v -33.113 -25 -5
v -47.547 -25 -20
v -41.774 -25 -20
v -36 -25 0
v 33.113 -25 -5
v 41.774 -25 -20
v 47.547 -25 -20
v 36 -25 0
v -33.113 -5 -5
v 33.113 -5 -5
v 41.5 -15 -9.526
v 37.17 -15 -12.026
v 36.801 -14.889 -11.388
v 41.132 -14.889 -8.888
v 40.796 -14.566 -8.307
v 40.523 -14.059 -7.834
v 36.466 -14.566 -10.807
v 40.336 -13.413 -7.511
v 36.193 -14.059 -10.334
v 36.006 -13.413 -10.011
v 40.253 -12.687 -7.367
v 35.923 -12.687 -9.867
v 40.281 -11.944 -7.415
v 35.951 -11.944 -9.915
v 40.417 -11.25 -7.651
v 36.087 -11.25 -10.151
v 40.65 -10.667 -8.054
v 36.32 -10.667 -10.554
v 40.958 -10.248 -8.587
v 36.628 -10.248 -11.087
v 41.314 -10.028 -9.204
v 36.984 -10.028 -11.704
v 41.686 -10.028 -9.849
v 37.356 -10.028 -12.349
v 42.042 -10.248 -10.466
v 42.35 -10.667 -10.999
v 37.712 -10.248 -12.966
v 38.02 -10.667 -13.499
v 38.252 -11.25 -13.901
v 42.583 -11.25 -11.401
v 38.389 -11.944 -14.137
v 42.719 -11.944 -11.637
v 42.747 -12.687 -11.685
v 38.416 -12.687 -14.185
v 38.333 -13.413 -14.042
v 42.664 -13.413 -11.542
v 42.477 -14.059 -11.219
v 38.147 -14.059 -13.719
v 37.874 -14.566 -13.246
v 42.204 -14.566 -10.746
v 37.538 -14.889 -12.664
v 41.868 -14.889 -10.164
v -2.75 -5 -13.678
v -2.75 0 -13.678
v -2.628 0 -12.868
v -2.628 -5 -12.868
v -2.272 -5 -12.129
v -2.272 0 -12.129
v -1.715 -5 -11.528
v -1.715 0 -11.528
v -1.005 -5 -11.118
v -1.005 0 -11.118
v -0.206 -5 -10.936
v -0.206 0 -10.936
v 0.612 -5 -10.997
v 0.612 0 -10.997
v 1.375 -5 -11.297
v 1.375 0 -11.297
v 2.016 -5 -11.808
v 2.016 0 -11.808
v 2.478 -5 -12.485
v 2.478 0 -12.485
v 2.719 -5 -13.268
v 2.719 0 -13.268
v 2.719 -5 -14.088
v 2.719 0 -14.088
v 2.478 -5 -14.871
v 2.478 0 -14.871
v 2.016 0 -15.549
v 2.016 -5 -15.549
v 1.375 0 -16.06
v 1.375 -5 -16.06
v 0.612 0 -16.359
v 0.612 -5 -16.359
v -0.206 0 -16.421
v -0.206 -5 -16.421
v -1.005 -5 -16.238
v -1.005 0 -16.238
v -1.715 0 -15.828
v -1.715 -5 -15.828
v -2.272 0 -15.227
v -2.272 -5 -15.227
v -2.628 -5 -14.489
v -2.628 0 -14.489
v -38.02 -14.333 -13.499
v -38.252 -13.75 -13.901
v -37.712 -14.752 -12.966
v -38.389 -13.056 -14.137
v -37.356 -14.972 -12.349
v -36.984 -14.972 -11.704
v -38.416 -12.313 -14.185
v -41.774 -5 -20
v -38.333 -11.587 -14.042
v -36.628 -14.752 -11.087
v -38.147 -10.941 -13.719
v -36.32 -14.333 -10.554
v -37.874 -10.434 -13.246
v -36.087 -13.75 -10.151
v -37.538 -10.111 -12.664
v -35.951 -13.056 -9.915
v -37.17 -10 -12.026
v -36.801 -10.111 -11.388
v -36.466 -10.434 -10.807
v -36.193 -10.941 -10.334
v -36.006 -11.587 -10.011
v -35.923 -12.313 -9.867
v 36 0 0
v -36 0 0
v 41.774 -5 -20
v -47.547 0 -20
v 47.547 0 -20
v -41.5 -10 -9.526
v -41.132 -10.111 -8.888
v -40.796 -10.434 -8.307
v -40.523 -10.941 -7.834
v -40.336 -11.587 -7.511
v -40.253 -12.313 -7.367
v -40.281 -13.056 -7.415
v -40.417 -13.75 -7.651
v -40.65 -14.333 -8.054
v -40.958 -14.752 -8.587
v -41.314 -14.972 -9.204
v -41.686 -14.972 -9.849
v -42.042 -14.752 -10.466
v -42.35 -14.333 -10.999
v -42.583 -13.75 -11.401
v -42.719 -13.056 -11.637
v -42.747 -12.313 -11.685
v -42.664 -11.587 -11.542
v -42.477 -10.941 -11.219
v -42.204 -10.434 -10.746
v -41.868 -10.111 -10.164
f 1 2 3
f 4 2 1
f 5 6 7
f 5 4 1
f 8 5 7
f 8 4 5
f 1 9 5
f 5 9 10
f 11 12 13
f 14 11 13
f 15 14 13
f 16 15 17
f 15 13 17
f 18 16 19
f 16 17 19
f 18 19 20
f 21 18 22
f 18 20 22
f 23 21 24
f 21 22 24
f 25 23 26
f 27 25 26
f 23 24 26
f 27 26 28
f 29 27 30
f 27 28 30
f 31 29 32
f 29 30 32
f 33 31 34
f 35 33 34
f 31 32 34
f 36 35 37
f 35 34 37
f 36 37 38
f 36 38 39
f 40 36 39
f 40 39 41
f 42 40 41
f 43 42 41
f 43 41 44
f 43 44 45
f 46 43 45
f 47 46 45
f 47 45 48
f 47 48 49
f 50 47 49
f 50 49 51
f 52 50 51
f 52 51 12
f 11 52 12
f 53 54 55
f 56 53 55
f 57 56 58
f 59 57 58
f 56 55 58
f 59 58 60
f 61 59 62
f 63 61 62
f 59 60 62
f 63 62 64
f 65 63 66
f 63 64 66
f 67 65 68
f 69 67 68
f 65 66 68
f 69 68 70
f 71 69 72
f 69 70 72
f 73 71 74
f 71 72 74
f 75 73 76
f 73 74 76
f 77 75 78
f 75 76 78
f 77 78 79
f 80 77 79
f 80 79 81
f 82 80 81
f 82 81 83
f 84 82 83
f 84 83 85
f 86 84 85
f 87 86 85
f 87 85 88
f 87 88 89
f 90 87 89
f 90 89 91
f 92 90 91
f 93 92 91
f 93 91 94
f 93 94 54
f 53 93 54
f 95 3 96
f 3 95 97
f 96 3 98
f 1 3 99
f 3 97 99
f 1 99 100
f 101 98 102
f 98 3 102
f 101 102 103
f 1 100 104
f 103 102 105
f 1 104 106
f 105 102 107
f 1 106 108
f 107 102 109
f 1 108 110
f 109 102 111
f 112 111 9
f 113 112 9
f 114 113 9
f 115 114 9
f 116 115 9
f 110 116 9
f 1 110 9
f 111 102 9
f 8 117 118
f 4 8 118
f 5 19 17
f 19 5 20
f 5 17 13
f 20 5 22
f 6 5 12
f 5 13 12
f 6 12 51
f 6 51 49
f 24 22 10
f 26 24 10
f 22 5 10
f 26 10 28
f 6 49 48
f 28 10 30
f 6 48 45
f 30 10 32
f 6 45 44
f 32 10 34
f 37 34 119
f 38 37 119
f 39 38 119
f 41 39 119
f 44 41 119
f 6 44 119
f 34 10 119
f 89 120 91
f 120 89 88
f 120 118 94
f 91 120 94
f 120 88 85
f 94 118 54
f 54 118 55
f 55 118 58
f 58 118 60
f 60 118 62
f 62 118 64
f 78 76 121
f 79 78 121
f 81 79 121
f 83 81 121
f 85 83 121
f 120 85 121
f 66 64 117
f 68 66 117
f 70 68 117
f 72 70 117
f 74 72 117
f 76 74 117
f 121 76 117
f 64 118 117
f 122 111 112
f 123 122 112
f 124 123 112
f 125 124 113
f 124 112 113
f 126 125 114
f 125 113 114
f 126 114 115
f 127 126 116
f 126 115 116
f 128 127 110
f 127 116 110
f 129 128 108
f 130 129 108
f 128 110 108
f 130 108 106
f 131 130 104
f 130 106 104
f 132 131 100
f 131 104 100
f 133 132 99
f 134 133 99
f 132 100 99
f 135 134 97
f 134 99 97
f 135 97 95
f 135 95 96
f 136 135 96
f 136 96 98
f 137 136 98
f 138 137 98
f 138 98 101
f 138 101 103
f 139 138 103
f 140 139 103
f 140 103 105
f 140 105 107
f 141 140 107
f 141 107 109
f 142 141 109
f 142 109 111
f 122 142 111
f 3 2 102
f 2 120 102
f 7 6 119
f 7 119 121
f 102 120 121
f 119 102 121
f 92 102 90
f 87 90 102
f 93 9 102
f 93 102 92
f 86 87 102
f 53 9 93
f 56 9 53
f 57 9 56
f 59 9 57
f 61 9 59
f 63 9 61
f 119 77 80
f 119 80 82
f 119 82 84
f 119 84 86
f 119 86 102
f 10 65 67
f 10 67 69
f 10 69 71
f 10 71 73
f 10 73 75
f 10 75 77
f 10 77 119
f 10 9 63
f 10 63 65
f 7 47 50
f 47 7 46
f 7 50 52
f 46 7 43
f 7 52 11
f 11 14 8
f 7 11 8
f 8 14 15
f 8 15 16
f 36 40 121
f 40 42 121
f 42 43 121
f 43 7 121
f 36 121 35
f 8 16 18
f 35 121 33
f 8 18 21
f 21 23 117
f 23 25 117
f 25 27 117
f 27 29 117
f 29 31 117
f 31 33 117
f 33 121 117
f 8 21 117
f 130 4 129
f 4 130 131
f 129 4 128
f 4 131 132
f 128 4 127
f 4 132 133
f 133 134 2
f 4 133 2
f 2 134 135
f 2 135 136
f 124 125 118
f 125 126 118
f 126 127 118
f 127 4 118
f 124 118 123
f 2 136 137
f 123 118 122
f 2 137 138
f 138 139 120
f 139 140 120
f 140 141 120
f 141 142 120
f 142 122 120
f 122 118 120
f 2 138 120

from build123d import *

# Parameters (mm, degrees)
F1_DEPTH = 5
F3_DEPTH = 20
F5_D     = 5.5
F7_D     = 5
F9_D     = 5


with BuildPart() as f1:
    # F0 (on Front) → F1 (new body)
    with BuildSketch(Plane.XZ):
        Polygon((36, 0), (0, 0), (-36, 0), (-47.5470053838, -20), (0, -20), (47.5470053838, -20), align=None)
    extrude(amount=F1_DEPTH)

    # F2 (on face) → F3 (join)
    with BuildSketch(Plane.XZ.offset(5)):
        Polygon((-30.2264973081, 0), (-36, 0), (-47.5470053838, -20), (-41.7735026919, -20), (-33.1132486541, -5), align=None)
        Polygon((30.2264973081, 0), (-30.2264973081, 0), (-33.1132486541, -5), (33.1132486541, -5), align=None)
        Polygon((36, 0), (30.2264973081, 0), (33.1132486541, -5), (41.7735026919, -20), (47.5470053838, -20), align=None)
    extrude(amount=F3_DEPTH)

    # F5 (through all)
    with Locations(Plane.XZ.offset(5)):
        with Locations((0, -13.6782340705)):
            Hole(F5_D / 2)

    # F7 (through all)
    with Locations(Plane(origin=(27, 0, 15.5884572681), x_dir=(0, 1, 0), z_dir=(0.8660254038, 0, 0.5))):
        with Locations((-12.5, -29)):
            Hole(F7_D / 2)

    # F9 (through all)
    with Locations(Plane(origin=(-27, 0, 15.5884572681), x_dir=(0, -1, 0), z_dir=(-0.8660254038, 0, 0.5))):
        with Locations((12.5, -29)):
            Hole(F9_D / 2)


solid = f1.part
